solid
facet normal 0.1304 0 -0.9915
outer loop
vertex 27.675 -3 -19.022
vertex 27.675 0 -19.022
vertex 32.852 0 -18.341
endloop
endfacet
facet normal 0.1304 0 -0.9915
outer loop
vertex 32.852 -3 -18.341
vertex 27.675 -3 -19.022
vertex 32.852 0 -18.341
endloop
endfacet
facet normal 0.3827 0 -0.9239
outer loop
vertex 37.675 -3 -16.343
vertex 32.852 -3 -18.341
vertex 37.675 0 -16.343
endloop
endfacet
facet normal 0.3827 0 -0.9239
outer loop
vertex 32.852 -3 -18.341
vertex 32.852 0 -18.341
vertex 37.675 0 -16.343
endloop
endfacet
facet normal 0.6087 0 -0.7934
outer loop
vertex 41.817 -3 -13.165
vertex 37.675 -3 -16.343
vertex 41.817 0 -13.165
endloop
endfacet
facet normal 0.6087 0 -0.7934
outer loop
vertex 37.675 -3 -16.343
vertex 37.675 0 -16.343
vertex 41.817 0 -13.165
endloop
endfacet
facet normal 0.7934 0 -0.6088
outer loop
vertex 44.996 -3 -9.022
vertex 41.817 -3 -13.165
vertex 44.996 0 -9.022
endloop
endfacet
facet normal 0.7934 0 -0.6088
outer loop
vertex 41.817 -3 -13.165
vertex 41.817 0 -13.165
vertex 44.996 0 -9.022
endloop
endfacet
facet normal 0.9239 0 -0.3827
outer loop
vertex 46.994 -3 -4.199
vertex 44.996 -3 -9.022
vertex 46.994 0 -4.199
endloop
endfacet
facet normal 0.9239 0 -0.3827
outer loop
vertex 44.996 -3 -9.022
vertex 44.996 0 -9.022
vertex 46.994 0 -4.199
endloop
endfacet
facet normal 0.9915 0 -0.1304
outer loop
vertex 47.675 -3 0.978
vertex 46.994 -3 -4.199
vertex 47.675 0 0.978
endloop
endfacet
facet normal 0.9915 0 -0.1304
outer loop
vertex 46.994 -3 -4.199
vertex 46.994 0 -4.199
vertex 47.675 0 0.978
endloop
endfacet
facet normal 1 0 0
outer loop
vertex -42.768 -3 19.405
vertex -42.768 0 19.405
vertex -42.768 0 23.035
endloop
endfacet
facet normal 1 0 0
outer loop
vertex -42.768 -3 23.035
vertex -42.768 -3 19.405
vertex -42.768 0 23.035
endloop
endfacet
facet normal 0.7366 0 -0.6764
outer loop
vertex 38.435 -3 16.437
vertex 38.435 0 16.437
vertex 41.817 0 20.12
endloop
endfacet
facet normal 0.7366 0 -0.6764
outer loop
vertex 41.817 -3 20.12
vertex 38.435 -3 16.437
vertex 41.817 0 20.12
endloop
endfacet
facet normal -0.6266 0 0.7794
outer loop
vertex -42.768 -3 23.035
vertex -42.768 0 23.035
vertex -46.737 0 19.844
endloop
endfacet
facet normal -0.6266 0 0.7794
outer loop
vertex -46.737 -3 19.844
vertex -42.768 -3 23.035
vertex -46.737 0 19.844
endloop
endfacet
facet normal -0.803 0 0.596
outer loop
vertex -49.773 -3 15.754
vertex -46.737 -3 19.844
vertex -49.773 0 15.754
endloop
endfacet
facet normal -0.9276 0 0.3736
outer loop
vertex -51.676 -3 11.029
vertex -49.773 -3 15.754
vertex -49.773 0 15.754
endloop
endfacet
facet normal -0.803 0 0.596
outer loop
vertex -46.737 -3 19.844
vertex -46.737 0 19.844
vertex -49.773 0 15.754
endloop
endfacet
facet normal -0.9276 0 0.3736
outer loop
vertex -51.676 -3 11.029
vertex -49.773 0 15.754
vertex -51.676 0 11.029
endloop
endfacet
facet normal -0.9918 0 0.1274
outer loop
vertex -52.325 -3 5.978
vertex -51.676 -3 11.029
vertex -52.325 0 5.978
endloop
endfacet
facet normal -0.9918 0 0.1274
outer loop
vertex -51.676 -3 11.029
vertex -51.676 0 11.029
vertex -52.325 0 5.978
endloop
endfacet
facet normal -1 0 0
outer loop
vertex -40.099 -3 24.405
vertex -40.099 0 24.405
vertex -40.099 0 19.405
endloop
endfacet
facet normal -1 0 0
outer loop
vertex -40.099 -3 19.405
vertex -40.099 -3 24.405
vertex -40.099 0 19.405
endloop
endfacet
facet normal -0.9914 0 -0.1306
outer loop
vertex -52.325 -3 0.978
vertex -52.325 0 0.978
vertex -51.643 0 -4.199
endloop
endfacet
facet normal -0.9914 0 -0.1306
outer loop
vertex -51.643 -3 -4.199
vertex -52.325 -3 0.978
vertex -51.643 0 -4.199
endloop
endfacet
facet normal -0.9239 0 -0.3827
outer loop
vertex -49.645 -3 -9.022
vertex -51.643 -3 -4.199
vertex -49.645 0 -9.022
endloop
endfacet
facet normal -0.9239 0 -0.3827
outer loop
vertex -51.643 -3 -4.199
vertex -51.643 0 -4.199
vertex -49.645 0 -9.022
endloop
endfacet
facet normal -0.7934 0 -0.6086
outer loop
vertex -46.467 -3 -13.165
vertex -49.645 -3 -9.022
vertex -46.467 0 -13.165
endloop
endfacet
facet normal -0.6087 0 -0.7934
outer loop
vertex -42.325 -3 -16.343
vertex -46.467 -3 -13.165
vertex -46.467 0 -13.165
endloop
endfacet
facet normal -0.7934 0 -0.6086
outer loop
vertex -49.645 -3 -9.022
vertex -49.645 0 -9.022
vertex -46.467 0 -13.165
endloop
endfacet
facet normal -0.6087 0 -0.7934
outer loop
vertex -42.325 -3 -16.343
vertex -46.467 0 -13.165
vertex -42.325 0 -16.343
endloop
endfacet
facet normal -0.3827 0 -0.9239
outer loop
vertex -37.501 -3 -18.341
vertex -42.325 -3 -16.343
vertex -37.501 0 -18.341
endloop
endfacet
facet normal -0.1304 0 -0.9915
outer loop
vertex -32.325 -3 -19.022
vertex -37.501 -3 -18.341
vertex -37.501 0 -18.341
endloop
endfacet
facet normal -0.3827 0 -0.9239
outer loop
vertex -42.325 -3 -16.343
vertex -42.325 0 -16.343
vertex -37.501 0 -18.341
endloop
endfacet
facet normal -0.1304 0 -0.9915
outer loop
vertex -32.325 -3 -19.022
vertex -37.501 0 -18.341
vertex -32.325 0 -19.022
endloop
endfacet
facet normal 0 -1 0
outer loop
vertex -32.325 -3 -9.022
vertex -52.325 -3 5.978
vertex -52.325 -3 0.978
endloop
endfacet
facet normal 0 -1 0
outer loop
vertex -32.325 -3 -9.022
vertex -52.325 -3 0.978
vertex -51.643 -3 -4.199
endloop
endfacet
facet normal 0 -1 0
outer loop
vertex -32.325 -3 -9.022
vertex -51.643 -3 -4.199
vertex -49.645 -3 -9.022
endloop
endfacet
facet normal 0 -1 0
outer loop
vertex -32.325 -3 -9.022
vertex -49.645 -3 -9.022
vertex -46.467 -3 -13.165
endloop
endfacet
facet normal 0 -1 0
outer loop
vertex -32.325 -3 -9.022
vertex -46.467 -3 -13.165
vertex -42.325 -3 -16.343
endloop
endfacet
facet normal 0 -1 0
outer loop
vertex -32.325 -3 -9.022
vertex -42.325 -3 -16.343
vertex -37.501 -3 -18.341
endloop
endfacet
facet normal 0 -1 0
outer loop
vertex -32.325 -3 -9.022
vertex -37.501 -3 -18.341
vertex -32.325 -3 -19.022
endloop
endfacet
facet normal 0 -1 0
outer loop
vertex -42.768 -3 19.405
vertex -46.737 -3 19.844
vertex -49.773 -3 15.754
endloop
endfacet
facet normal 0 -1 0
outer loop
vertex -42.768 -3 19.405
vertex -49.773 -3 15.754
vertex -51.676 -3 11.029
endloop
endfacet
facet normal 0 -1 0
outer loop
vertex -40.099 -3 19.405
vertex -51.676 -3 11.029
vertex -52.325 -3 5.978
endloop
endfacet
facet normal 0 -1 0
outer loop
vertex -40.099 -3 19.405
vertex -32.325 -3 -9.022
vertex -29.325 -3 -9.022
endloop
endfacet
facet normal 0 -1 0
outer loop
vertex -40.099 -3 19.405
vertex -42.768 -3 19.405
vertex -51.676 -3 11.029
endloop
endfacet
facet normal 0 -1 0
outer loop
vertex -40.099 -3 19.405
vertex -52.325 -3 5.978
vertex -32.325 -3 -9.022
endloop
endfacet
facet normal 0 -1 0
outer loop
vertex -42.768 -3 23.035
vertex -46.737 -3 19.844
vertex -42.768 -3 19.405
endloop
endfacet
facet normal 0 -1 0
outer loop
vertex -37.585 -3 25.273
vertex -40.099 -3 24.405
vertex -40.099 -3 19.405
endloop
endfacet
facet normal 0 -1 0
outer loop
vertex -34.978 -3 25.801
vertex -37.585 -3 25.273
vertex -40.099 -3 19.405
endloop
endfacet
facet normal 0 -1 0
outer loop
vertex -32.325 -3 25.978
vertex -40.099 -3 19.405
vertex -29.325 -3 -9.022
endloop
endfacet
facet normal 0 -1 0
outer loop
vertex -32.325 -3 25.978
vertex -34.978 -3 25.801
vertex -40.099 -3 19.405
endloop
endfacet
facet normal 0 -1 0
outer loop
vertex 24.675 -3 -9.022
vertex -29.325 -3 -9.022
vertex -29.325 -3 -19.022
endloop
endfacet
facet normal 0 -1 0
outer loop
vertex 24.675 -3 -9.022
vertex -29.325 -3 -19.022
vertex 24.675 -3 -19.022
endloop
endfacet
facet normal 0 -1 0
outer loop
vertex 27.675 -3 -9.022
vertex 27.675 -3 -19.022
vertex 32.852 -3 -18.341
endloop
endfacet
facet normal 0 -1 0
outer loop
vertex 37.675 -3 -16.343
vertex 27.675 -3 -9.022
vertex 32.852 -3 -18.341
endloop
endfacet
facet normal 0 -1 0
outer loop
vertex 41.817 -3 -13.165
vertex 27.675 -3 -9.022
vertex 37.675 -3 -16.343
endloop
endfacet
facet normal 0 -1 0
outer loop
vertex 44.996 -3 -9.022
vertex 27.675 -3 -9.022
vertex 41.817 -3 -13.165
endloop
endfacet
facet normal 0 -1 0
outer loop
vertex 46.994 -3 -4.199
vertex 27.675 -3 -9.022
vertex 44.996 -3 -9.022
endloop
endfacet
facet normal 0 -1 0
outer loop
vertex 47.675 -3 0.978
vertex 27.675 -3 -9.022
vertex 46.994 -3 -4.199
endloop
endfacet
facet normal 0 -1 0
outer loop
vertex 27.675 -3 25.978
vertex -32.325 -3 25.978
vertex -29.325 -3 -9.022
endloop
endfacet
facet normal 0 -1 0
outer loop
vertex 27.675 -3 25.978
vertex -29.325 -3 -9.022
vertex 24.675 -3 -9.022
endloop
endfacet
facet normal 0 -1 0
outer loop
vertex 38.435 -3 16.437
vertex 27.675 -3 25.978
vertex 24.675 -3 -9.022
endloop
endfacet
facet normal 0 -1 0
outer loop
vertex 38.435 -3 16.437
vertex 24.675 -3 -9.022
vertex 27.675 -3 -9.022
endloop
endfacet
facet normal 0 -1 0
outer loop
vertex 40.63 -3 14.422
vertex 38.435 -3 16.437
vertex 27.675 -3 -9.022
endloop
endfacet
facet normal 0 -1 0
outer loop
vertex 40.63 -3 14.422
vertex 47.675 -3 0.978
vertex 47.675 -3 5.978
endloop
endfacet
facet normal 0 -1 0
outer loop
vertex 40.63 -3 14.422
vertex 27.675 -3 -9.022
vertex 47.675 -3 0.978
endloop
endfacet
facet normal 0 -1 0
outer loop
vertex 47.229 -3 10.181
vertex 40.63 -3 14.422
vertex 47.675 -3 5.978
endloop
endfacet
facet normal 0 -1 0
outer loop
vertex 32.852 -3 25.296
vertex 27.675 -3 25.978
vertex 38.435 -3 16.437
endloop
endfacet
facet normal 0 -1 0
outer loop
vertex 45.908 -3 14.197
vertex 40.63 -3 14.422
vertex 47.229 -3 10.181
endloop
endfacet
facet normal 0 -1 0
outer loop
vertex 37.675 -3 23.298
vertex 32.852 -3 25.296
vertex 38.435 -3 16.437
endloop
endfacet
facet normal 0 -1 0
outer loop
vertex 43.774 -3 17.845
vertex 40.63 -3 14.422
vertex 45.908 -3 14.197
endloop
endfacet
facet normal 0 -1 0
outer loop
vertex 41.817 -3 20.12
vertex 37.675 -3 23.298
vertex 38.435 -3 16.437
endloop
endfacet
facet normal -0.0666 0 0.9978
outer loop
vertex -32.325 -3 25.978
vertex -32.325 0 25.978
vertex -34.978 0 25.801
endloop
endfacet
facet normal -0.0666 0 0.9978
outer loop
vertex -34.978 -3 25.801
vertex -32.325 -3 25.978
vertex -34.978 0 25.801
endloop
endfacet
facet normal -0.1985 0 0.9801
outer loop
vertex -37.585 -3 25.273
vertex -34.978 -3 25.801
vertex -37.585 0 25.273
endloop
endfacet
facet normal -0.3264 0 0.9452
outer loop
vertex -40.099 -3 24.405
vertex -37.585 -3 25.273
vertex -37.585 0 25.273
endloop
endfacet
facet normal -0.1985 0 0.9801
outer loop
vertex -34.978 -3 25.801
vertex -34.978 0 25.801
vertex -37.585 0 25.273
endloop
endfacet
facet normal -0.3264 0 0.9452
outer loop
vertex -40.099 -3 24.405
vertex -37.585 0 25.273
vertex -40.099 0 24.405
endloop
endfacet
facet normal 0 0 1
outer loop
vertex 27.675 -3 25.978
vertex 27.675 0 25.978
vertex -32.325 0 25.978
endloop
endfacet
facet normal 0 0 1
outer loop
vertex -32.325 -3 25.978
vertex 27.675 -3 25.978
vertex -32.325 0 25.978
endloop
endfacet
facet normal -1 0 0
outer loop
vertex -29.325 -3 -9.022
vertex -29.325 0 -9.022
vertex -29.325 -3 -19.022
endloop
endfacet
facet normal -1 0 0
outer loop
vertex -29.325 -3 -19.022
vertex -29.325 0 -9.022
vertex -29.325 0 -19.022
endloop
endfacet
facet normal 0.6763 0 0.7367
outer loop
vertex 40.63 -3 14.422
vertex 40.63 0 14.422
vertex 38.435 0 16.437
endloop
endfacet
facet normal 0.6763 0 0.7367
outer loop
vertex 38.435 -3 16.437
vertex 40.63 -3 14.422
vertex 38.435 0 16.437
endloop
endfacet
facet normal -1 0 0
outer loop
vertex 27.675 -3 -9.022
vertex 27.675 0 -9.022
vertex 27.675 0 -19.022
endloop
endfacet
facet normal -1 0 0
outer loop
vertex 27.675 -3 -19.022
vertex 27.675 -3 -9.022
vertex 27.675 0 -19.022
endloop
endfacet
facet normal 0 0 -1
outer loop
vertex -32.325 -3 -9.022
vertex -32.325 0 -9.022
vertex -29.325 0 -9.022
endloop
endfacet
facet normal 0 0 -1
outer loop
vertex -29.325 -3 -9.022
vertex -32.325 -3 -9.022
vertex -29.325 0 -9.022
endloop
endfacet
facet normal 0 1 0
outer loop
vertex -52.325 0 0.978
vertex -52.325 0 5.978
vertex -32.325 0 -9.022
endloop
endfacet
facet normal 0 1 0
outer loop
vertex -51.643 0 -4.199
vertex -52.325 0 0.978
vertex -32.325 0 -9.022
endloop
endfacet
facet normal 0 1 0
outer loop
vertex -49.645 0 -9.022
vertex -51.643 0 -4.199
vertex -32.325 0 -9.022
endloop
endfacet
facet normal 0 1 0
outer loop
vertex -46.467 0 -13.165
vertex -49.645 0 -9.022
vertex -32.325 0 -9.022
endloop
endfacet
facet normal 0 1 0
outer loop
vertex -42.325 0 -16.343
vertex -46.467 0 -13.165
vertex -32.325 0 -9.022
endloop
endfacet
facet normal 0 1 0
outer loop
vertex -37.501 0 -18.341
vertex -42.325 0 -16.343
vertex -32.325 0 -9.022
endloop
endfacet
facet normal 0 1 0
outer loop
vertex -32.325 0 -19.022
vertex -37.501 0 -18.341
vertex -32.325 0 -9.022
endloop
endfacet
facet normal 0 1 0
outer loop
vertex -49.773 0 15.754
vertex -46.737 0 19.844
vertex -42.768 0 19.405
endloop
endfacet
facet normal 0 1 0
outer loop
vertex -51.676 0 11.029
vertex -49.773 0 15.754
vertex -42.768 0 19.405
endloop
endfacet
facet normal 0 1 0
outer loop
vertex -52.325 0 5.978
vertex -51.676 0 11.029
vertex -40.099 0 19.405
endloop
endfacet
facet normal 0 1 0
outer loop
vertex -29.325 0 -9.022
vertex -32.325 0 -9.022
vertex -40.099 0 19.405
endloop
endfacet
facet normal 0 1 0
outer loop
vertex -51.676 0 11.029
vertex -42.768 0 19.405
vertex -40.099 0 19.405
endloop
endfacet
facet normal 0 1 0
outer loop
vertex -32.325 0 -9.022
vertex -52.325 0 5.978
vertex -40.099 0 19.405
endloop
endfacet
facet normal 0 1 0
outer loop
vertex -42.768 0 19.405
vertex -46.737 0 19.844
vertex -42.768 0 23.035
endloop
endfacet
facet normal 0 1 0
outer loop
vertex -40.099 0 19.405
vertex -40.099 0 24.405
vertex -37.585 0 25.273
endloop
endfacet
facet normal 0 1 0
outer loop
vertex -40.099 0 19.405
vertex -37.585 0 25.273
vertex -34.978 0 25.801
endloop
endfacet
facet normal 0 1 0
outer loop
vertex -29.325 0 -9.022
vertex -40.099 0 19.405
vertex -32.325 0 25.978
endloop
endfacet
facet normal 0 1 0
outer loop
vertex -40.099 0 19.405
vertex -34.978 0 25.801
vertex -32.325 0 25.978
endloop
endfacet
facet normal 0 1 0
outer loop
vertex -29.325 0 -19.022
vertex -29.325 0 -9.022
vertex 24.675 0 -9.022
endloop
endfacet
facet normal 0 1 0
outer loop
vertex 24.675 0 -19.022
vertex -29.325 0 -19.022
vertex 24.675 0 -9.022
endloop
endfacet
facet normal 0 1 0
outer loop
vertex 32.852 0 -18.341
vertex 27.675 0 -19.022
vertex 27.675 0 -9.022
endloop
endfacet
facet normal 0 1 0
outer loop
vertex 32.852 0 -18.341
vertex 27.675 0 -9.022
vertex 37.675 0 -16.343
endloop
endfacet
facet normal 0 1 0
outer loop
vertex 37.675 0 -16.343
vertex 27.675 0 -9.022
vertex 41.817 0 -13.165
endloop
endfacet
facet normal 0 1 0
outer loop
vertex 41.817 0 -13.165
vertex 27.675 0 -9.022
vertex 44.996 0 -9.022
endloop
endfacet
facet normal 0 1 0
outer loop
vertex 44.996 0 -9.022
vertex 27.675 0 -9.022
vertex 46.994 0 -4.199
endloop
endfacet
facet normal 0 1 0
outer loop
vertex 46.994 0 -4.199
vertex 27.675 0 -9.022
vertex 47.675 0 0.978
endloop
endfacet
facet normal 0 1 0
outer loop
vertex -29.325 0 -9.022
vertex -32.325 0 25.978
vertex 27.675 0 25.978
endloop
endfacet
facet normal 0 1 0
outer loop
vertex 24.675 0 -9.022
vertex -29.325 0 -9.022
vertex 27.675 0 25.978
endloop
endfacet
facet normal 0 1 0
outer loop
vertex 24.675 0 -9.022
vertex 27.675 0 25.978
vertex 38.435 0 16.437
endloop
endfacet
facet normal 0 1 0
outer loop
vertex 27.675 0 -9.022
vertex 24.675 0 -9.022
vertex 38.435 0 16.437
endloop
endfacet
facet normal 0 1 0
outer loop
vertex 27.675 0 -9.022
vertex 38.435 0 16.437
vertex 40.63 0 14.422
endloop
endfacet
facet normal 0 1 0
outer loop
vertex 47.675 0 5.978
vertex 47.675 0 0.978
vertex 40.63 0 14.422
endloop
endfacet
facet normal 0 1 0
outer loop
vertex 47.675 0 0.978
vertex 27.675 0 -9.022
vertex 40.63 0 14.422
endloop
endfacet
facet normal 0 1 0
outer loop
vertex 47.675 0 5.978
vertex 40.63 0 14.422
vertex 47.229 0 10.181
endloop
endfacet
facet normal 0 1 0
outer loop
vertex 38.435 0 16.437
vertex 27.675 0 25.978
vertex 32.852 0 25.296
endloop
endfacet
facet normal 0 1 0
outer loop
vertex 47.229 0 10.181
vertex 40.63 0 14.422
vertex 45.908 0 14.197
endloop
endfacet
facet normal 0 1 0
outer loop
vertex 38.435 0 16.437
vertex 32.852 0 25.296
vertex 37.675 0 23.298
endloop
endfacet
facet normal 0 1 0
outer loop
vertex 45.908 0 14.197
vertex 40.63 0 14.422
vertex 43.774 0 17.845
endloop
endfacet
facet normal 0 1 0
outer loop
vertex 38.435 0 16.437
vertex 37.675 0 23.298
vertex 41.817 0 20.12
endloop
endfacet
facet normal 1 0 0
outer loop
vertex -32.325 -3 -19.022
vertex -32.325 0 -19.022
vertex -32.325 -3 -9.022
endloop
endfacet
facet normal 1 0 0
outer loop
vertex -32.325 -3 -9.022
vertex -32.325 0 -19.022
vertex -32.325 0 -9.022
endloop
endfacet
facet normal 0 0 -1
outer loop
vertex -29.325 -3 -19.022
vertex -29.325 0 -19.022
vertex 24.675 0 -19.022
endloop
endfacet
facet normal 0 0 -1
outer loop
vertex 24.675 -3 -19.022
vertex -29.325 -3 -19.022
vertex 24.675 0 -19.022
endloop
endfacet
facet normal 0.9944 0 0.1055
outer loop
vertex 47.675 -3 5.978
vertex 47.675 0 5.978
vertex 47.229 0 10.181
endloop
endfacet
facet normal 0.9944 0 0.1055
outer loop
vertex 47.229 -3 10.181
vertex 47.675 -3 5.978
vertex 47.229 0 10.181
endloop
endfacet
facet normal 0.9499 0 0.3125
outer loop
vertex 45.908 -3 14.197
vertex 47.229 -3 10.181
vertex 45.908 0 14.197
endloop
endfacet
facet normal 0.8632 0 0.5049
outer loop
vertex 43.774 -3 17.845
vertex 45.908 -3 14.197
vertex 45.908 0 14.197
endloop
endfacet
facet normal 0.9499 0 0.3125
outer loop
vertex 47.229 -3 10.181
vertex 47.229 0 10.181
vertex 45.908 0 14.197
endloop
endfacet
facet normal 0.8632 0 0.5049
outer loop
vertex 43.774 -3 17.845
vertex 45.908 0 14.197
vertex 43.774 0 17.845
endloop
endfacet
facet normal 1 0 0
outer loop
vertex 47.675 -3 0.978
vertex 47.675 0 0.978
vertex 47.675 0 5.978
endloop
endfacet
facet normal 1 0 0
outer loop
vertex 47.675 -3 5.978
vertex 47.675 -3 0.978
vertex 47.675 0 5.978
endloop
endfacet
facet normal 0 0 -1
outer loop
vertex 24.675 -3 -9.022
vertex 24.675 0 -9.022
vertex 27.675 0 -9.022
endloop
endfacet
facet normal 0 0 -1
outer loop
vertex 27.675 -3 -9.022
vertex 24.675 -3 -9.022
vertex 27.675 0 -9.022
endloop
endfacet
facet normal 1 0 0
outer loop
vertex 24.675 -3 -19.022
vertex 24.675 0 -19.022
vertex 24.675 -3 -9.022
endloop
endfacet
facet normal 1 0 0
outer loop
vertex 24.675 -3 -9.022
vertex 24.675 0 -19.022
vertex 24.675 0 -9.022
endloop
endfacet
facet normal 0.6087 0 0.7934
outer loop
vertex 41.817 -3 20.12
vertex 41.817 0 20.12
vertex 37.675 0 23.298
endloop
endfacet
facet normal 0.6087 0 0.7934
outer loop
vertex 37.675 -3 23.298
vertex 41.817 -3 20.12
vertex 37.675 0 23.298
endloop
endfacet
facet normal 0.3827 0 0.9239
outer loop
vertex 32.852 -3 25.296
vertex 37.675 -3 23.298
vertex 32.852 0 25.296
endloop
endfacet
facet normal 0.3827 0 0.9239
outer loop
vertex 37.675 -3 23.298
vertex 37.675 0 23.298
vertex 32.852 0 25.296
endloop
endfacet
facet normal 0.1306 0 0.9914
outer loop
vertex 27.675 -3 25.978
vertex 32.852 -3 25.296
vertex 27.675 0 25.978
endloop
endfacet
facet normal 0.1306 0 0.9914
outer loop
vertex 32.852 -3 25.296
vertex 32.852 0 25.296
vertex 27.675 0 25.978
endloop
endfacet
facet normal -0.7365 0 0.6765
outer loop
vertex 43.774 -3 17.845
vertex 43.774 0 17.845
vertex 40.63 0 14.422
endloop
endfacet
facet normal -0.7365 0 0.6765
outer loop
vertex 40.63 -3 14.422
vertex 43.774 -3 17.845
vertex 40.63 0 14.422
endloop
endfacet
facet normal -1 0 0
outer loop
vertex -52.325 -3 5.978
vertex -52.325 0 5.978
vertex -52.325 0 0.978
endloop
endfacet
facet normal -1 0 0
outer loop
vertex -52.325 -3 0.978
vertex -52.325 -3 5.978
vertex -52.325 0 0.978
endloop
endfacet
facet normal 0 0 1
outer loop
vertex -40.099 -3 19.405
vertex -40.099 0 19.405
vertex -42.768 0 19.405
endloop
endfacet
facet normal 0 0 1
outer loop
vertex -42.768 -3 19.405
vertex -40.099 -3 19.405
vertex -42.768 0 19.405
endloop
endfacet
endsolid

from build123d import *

# Parameters (mm, degrees)
F1_DEPTH = 3


with BuildPart() as f1:
    # F0 (on Front) → F1 (new body)
    with BuildSketch(Plane.XZ):
        with BuildLine():
            Line((27.675254, 25.977628), (-32.324746, 25.977628))
            ThreePointArc((-32.324746, 25.977628), (-36.290467, 25.580511), (-40.098703, 24.404933))
            Line((-40.098703, 24.404933), (-40.098703, 19.404933))
            Line((-40.098703, 19.404933), (-42.767557, 19.404933))
            Line((-42.767557, 19.404933), (-42.767557, 23.034817))
            ThreePointArc((-42.767557, 23.034817), (-49.772614, 15.753715), (-52.324746, 5.977628))
            Line((-52.324746, 5.977628), (-52.324746, 0.977628))
            ThreePointArc((-52.324746, 0.977628), (-46.466882, -13.164508), (-32.324746, -19.022372))
            Line((-32.324746, -19.022372), (-32.324746, -9.022372))
            Line((-32.324746, -9.022372), (-29.324746, -9.022372))
            Line((-29.324746, -9.022372), (-29.324746, -19.022372))
            Line((-29.324746, -19.022372), (24.675254, -19.022372))
            Line((24.675254, -19.022372), (24.675254, -9.022372))
            Line((24.675254, -9.022372), (27.675254, -9.022372))
            Line((27.675254, -9.022372), (27.675254, -19.022372))
            ThreePointArc((27.675254, -19.022372), (41.81739, -13.164508), (47.675254, 0.977628))
            Line((47.675254, 0.977628), (47.675254, 5.977628))
            ThreePointArc((47.675254, 5.977628), (46.674828, 12.223921), (43.773636, 17.845318))
            Line((43.773636, 17.845318), (40.629784, 14.421898))
            Line((40.629784, 14.421898), (38.435426, 16.437057))
            Line((38.435426, 16.437057), (41.81739, 20.119763))
            ThreePointArc((41.81739, 20.119763), (35.328923, 24.455218), (27.675254, 25.977628))
        make_face()
    extrude(amount=F1_DEPTH)


solid = f1.part
